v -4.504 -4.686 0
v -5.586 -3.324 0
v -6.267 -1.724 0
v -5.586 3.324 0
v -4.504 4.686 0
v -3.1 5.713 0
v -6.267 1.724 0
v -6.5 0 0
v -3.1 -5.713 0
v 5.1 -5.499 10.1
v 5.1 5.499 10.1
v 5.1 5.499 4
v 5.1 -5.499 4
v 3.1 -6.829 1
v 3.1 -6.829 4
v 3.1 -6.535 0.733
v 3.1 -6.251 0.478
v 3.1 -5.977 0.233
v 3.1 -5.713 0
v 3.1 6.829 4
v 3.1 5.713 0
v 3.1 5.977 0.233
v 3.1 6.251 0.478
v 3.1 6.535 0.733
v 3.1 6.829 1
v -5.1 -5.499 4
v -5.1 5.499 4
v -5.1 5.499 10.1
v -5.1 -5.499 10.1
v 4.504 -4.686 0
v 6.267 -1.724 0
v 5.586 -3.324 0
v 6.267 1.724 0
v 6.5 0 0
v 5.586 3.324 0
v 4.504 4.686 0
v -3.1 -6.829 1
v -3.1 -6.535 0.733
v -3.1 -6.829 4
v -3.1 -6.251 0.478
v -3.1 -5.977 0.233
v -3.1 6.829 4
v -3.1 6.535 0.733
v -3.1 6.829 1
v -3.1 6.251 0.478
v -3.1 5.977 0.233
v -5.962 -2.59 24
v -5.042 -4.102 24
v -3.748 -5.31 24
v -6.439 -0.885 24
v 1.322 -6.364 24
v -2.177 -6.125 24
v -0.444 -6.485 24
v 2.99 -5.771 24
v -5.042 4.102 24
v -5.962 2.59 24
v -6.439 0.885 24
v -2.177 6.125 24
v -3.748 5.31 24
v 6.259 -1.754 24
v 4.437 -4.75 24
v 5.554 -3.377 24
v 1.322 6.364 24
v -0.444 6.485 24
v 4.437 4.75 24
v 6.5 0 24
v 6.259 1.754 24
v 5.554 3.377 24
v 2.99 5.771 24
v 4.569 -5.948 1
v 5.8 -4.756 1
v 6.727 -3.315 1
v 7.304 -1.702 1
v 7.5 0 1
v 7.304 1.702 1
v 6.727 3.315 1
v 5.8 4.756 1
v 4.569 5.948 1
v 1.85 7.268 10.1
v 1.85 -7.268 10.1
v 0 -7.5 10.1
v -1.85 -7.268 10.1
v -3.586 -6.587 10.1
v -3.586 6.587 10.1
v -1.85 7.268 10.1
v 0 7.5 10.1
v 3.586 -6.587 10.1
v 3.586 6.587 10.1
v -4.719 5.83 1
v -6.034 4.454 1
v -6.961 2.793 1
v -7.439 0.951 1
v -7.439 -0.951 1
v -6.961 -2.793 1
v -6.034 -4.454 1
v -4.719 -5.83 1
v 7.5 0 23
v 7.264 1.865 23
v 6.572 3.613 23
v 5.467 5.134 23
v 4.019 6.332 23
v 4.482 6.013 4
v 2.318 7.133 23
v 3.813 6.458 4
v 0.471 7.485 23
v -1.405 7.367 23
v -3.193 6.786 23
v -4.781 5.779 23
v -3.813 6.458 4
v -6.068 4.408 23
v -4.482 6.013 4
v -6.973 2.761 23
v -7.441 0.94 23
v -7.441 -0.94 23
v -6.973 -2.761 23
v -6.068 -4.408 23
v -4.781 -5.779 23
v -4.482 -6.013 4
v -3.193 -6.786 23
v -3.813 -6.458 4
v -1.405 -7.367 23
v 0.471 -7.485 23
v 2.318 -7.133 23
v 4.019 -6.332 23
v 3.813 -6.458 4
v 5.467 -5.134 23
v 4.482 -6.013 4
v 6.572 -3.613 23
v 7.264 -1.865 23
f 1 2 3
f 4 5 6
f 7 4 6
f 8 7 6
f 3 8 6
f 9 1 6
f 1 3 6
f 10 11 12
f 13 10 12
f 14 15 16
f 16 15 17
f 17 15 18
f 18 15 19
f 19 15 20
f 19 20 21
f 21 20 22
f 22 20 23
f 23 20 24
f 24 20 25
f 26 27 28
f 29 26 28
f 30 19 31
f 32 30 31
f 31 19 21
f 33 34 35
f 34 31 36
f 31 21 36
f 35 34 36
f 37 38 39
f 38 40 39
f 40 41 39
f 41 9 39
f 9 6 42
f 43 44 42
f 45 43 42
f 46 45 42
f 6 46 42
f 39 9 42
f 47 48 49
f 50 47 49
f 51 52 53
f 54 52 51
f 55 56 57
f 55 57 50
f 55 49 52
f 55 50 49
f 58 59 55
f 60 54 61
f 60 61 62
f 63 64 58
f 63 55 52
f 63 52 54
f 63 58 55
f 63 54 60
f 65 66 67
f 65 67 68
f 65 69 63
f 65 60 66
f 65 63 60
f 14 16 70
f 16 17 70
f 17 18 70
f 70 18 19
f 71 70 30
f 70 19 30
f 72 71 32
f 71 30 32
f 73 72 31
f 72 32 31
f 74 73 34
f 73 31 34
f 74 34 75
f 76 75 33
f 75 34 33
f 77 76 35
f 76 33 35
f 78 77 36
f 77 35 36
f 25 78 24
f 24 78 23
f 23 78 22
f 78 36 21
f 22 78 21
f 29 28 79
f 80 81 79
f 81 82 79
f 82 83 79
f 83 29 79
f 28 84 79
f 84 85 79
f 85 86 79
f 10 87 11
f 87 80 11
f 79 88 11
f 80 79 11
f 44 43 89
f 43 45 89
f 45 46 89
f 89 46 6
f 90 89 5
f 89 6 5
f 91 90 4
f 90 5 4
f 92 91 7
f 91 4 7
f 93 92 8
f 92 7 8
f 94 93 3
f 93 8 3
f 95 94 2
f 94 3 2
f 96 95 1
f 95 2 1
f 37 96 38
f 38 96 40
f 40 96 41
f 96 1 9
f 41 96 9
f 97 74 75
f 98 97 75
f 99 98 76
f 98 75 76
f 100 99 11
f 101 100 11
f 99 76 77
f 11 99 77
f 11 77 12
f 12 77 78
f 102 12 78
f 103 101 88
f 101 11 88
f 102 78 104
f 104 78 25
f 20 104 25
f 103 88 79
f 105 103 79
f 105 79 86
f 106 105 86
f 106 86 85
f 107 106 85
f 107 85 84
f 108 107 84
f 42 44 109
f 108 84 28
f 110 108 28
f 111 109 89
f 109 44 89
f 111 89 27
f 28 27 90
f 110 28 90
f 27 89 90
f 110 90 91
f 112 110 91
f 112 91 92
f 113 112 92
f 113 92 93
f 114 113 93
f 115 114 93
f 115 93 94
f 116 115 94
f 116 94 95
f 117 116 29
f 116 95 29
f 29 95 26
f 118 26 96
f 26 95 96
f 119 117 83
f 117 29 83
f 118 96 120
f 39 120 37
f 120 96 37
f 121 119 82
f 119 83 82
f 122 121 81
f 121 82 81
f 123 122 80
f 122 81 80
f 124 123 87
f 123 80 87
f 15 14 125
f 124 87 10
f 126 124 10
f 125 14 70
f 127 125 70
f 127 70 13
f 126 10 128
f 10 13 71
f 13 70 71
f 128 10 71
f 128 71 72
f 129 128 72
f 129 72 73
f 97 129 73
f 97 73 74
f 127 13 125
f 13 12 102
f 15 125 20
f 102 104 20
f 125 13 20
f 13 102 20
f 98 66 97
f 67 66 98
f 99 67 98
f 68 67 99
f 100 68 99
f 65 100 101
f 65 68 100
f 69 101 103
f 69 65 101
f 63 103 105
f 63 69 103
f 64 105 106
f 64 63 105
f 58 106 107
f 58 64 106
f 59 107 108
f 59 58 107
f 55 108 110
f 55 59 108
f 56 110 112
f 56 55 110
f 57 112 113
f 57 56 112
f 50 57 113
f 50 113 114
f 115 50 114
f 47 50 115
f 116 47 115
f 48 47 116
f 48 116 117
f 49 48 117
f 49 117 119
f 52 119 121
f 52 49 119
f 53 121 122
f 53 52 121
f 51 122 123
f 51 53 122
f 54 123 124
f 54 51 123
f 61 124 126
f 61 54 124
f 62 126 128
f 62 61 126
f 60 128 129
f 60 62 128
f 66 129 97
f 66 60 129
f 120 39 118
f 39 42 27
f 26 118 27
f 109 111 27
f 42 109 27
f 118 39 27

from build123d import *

# Parameters (mm, degrees)
SKETCH_1_R          = 7.5
EXTRUDE_1_DEPTH     = 24
CUT_EXTRUDE_1_DEPTH = 10
CHAMFER_1_SIZE      = 1
CHAMFER_2_SIZE      = 1


with BuildPart() as part:
    # 草图1 → 凸台-拉伸1 (new body)
    with BuildSketch(Plane.XY):
        Circle(SKETCH_1_R)
    extrude(amount=EXTRUDE_1_DEPTH)

    # 草图2 → 切除-拉伸1 (cut, symmetric)
    with BuildSketch(Plane(origin=(0, 0, 0), x_dir=(1, 0, 0), z_dir=(0, 1, 0))):
        Polygon((3.1, 0), (-3.1, 0), (-3.1, -4), (-5.1, -4), (-5.1, -10.1), (5.1, -10.1), (5.1, -4), (3.1, -4), align=None)
    extrude(amount=CUT_EXTRUDE_1_DEPTH, both=True, mode=Mode.SUBTRACT)

    # 倒角1
    chamfer_1_edges = [part.edges().sort_by_distance(p)[0] for p in [
        (-7.5, 0, 24),
    ]]
    chamfer(chamfer_1_edges, length=CHAMFER_1_SIZE)

    # 倒角2
    chamfer_2_edges = [part.edges().sort_by_distance(p)[0] for p in [
        (-7.5, 0, 0),
        (6.304760106, -4.062019202, 0),
    ]]
    chamfer(chamfer_2_edges, length=CHAMFER_2_SIZE)


solid = part.part
